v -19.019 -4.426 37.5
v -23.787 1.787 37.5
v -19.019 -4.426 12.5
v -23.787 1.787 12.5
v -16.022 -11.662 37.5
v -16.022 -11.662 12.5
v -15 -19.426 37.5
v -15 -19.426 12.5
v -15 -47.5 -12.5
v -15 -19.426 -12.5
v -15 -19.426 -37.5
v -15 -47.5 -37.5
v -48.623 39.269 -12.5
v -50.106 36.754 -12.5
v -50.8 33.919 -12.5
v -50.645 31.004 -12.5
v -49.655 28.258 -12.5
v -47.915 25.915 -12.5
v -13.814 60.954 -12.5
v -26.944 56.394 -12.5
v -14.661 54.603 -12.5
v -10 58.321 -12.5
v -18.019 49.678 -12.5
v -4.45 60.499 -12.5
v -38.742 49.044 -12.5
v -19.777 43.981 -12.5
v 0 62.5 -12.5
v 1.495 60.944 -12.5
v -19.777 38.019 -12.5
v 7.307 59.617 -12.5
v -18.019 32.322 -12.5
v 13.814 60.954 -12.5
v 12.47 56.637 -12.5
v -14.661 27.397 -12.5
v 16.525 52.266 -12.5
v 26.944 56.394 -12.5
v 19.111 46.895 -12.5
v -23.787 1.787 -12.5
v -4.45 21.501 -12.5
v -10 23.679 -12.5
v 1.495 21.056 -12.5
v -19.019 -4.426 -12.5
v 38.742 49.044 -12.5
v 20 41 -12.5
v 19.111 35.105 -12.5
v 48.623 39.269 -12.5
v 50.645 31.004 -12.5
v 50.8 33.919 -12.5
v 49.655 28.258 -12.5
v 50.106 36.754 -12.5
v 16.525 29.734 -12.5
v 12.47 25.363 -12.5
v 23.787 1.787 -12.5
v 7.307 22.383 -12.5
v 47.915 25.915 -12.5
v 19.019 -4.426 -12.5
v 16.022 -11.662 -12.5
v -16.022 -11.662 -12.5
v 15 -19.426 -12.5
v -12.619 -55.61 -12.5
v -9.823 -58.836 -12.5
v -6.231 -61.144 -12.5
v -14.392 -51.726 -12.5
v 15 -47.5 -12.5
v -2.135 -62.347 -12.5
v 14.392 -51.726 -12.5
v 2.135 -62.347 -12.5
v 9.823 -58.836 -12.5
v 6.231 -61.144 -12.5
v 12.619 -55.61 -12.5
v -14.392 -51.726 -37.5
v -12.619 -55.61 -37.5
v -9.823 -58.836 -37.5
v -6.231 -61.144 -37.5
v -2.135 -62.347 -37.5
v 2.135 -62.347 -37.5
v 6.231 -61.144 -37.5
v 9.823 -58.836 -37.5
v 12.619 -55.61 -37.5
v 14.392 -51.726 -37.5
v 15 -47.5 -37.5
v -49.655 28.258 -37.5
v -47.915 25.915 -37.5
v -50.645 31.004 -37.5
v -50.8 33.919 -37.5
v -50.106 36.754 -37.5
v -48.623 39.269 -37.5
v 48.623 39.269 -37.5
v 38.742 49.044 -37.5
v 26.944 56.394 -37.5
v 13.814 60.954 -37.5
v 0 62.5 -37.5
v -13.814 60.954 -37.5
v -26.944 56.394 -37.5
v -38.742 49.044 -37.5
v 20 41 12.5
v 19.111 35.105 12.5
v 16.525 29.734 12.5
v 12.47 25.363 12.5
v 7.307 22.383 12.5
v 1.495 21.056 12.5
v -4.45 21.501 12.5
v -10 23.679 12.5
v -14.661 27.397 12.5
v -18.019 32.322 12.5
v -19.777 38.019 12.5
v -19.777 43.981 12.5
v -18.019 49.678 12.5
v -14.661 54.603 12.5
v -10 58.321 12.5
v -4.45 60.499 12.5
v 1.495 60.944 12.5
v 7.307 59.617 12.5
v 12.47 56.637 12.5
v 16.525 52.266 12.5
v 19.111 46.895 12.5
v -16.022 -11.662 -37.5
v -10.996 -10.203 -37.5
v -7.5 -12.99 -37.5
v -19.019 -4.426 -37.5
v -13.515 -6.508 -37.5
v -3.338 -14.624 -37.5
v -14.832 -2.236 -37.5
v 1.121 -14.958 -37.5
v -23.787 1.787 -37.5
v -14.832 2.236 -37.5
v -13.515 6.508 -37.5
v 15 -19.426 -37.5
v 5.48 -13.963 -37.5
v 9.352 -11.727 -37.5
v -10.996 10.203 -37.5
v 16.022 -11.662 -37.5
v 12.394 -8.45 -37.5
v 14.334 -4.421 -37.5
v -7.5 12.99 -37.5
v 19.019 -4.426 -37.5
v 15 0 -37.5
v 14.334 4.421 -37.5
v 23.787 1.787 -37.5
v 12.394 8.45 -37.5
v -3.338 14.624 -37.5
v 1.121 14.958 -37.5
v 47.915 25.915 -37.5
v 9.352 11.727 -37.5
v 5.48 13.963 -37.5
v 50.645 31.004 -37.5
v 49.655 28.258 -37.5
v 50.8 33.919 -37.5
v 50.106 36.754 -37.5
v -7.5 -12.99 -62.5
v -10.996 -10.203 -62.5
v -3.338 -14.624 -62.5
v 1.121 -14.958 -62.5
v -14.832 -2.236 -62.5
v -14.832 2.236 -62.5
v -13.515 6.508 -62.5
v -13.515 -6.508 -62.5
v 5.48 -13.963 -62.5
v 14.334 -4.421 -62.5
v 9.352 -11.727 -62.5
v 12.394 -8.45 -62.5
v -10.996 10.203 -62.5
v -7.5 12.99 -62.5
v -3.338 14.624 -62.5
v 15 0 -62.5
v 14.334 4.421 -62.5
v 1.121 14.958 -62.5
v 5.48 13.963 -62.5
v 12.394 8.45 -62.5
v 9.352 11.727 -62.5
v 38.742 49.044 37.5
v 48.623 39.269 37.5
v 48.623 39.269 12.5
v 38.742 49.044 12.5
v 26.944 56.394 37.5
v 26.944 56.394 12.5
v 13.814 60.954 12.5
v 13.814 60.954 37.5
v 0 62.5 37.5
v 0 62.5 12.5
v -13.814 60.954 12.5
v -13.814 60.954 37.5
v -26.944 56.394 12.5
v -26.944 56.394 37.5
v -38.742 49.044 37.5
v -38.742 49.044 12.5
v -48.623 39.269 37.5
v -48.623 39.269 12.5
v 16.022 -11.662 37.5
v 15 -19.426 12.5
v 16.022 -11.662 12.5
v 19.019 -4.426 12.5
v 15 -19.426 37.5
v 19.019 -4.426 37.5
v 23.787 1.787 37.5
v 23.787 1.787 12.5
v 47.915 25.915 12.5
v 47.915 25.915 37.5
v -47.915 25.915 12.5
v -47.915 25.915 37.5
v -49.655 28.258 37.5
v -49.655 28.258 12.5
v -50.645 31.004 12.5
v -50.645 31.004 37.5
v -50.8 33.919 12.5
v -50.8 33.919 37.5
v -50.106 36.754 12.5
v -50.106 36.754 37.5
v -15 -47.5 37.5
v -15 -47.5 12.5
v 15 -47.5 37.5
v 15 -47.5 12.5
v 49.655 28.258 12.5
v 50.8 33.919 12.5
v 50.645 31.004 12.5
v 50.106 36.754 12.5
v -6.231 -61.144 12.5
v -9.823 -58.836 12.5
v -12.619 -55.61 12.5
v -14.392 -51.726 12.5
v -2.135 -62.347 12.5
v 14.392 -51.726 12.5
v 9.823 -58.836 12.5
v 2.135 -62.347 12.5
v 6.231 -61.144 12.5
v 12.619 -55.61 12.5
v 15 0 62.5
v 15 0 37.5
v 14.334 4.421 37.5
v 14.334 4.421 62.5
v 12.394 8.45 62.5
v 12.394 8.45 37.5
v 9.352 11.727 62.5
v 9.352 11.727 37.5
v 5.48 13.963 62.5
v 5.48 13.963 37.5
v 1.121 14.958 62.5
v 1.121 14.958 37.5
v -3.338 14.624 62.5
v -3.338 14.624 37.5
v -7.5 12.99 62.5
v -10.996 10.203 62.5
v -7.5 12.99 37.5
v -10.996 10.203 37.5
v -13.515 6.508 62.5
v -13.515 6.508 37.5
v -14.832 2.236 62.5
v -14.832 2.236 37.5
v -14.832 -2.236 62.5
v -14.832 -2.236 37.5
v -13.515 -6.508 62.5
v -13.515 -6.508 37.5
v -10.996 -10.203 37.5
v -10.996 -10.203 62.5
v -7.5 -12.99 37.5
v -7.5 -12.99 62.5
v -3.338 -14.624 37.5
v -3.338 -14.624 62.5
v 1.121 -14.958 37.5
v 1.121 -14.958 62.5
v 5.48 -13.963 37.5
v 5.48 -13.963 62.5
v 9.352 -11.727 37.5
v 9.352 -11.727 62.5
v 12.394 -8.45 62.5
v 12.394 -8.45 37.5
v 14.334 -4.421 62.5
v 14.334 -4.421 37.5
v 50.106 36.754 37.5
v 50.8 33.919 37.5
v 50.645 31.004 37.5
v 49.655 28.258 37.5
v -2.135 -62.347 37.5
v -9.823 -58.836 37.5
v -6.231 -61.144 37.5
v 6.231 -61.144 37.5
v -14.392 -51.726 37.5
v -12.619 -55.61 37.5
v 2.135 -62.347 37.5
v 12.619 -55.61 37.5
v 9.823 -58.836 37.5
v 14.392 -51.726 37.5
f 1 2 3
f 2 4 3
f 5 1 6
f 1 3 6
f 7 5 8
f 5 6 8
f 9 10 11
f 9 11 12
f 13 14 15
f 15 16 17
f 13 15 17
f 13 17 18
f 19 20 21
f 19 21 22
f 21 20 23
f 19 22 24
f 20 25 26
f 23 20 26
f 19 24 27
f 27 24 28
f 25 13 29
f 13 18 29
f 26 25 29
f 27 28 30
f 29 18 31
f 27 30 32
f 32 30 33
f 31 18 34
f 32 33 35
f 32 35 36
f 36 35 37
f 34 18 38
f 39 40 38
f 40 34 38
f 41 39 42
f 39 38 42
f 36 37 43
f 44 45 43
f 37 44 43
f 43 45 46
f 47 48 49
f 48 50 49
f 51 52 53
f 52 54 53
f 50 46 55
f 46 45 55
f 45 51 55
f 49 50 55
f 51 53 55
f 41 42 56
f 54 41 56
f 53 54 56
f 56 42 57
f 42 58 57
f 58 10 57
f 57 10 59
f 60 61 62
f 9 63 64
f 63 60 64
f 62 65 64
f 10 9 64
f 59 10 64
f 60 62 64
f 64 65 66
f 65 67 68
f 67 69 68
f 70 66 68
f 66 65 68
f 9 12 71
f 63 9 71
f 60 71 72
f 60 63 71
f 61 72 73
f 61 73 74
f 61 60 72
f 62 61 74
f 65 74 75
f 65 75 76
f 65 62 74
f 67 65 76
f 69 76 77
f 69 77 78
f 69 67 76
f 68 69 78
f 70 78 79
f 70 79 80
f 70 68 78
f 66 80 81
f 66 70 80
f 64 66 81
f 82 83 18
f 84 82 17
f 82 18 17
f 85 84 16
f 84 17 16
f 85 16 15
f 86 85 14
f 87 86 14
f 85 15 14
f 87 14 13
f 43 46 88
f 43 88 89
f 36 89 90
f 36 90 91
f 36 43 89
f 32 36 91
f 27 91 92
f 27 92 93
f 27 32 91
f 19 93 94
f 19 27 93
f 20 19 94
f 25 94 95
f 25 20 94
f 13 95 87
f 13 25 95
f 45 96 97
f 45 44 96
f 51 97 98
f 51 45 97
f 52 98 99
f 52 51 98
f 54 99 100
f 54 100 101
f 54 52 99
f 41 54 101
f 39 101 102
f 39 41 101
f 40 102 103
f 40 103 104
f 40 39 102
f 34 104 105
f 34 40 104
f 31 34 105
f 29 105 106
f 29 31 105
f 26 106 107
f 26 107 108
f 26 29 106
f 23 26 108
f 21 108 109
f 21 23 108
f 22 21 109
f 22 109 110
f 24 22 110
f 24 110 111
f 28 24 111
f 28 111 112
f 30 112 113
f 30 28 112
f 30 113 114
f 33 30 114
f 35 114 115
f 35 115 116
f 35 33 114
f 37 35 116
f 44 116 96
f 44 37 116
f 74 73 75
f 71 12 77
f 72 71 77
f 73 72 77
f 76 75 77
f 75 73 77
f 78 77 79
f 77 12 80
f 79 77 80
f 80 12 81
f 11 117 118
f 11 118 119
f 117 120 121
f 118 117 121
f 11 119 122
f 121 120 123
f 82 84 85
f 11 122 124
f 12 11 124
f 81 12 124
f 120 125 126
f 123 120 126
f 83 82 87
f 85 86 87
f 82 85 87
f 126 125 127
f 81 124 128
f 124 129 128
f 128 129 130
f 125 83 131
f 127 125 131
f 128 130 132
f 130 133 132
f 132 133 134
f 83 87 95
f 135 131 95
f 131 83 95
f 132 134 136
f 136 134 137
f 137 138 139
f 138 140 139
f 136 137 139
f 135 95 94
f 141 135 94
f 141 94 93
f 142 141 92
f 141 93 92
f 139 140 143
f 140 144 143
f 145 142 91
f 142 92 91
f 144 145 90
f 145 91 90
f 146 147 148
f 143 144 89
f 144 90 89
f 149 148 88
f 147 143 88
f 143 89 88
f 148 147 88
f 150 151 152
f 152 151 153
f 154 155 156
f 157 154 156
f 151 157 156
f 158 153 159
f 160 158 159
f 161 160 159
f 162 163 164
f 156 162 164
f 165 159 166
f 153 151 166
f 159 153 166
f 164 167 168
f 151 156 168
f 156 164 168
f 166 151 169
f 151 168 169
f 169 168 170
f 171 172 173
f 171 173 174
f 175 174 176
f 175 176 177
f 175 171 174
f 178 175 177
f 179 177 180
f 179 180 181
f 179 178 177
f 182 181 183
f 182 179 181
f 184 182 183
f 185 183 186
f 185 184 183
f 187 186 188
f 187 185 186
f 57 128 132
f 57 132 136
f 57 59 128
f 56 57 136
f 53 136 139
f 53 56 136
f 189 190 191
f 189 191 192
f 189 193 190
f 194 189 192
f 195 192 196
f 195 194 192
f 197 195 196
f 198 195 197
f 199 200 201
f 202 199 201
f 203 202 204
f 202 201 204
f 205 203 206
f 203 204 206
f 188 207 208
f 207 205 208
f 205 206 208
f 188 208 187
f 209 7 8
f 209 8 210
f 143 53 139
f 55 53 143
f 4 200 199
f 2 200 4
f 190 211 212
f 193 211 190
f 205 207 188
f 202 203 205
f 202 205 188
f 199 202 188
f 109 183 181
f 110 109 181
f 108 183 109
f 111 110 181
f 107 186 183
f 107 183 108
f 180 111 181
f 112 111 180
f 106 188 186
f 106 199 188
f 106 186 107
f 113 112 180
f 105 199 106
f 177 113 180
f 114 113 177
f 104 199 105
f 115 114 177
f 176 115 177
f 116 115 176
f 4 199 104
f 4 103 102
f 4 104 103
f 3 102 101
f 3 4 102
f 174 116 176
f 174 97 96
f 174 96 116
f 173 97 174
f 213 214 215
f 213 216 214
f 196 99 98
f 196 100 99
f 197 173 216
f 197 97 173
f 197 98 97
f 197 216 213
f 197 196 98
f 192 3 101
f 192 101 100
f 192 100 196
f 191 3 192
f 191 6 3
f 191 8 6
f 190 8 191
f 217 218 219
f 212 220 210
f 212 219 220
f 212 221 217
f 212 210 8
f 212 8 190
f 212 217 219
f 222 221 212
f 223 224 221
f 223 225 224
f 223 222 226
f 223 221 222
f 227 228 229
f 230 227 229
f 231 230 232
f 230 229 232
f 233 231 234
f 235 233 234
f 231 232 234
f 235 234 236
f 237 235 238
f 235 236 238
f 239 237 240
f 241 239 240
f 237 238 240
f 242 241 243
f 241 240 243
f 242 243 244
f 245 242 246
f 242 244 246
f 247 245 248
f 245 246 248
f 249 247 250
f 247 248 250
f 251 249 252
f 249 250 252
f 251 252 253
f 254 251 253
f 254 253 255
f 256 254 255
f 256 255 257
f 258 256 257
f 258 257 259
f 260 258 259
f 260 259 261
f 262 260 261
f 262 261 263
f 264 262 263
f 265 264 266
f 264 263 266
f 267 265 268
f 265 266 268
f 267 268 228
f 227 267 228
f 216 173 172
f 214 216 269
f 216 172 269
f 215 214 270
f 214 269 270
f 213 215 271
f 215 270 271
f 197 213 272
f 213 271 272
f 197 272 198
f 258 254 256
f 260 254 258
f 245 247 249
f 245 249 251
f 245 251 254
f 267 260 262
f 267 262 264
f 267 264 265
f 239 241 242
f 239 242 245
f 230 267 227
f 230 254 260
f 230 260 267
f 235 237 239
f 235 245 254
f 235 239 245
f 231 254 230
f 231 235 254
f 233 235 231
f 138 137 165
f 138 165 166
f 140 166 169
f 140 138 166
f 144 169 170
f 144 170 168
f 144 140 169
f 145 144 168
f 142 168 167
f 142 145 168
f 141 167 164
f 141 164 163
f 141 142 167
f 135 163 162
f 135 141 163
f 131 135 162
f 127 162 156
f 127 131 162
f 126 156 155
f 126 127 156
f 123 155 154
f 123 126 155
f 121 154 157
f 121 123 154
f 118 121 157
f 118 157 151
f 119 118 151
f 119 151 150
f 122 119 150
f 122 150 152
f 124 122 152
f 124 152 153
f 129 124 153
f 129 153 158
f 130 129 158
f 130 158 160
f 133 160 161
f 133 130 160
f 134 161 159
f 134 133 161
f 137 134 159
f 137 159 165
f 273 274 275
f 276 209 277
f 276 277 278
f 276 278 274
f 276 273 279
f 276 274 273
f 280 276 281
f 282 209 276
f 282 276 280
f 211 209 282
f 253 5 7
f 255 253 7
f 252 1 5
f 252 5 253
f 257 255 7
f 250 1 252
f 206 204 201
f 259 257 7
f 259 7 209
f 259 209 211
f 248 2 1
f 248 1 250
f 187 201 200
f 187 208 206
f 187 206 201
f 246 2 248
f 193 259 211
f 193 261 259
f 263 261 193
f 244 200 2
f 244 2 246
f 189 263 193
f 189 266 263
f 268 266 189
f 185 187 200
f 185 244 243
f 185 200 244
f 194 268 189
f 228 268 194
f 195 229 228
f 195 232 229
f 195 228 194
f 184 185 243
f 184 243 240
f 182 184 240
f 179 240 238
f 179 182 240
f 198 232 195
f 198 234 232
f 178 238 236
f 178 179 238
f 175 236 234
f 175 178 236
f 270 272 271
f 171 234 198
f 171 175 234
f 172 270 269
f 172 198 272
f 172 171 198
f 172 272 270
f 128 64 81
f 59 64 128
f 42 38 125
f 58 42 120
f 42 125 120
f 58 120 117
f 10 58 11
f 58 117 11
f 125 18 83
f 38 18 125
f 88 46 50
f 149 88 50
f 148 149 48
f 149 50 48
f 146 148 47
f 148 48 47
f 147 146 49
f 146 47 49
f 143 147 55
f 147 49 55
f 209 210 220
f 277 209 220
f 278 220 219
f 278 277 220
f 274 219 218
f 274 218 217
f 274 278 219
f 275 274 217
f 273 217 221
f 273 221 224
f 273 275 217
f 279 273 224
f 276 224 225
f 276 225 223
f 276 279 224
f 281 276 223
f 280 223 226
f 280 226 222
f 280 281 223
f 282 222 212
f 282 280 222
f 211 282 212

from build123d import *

# Parameters (mm, degrees)
BOSS_EXTRUDE1_DEPTH = 37.5
FILLET1_R           = 10
SKETCH4_W           = 25
SKETCH4_H           = 105.707635496
FILLET2_R           = 30
SKETCH5_R           = 15
BOSS_EXTRUDE2_DEPTH = 25


with BuildPart() as part:
    # Sketch2 → Boss-Extrude1 (new body, symmetric)
    with BuildSketch(Plane.XY):
        with BuildLine():
            Line((15, -47.5), (15, -7))
            Line((15, -7), (53.80332931, 31.80332931))
            ThreePointArc((53.80332931, 31.80332931), (0, 62.5), (-53.80332931, 31.80332931))
            Line((-53.80332931, 31.80332931), (-15, -7))
            Line((-15, -7), (-15, -47.5))
            ThreePointArc((-15, -47.5), (0, -62.5), (15, -47.5))
        make_face()
    extrude(amount=BOSS_EXTRUDE1_DEPTH, both=True)

    # Fillet1
    fillet1_edges = [part.edges().sort_by_distance(p)[0] for p in [
        (-53.80332931, 31.80332931, 0),
        (53.80332931, 31.80332931, 0),
    ]]
    fillet(fillet1_edges, radius=FILLET1_R)

    # Sketch4 → Cut-Revolve1 (revolve, cut)
    with BuildSketch(Plane(origin=(0, 0, 0), x_dir=(0, 0, -1), z_dir=(1, 0, 0)), mode=Mode.PRIVATE) as cut_revolve1_sk:
        with Locations((0, -31.853817748)):
            Rectangle(SKETCH4_W, SKETCH4_H)
    revolve(cut_revolve1_sk.sketch.rotate(Axis((0, 41, 37.5), (0, 0, -1)), 270), axis=Axis((0, 41, 37.5), (0, 0, -1)), mode=Mode.SUBTRACT)  # turned: the seam where the file's is

    # Fillet2
    fillet2_edges = [part.edges().sort_by_distance(p)[0] for p in [
        (15, -7, 25),
        (-15, -7, 25),
        (15, -7, -25),
        (-15, -7, -25),
    ]]
    fillet(fillet2_edges, radius=FILLET2_R)

    # Sketch5 → Boss-Extrude2 (add)
    with BuildSketch(Plane.XY.offset(37.5)):
        Circle(SKETCH5_R)
    boss_extrude2 = extrude(amount=BOSS_EXTRUDE2_DEPTH)

    # Mirror1: Boss-Extrude2 across plane
    add(boss_extrude2.mirror(Plane.XY))


solid = part.part
